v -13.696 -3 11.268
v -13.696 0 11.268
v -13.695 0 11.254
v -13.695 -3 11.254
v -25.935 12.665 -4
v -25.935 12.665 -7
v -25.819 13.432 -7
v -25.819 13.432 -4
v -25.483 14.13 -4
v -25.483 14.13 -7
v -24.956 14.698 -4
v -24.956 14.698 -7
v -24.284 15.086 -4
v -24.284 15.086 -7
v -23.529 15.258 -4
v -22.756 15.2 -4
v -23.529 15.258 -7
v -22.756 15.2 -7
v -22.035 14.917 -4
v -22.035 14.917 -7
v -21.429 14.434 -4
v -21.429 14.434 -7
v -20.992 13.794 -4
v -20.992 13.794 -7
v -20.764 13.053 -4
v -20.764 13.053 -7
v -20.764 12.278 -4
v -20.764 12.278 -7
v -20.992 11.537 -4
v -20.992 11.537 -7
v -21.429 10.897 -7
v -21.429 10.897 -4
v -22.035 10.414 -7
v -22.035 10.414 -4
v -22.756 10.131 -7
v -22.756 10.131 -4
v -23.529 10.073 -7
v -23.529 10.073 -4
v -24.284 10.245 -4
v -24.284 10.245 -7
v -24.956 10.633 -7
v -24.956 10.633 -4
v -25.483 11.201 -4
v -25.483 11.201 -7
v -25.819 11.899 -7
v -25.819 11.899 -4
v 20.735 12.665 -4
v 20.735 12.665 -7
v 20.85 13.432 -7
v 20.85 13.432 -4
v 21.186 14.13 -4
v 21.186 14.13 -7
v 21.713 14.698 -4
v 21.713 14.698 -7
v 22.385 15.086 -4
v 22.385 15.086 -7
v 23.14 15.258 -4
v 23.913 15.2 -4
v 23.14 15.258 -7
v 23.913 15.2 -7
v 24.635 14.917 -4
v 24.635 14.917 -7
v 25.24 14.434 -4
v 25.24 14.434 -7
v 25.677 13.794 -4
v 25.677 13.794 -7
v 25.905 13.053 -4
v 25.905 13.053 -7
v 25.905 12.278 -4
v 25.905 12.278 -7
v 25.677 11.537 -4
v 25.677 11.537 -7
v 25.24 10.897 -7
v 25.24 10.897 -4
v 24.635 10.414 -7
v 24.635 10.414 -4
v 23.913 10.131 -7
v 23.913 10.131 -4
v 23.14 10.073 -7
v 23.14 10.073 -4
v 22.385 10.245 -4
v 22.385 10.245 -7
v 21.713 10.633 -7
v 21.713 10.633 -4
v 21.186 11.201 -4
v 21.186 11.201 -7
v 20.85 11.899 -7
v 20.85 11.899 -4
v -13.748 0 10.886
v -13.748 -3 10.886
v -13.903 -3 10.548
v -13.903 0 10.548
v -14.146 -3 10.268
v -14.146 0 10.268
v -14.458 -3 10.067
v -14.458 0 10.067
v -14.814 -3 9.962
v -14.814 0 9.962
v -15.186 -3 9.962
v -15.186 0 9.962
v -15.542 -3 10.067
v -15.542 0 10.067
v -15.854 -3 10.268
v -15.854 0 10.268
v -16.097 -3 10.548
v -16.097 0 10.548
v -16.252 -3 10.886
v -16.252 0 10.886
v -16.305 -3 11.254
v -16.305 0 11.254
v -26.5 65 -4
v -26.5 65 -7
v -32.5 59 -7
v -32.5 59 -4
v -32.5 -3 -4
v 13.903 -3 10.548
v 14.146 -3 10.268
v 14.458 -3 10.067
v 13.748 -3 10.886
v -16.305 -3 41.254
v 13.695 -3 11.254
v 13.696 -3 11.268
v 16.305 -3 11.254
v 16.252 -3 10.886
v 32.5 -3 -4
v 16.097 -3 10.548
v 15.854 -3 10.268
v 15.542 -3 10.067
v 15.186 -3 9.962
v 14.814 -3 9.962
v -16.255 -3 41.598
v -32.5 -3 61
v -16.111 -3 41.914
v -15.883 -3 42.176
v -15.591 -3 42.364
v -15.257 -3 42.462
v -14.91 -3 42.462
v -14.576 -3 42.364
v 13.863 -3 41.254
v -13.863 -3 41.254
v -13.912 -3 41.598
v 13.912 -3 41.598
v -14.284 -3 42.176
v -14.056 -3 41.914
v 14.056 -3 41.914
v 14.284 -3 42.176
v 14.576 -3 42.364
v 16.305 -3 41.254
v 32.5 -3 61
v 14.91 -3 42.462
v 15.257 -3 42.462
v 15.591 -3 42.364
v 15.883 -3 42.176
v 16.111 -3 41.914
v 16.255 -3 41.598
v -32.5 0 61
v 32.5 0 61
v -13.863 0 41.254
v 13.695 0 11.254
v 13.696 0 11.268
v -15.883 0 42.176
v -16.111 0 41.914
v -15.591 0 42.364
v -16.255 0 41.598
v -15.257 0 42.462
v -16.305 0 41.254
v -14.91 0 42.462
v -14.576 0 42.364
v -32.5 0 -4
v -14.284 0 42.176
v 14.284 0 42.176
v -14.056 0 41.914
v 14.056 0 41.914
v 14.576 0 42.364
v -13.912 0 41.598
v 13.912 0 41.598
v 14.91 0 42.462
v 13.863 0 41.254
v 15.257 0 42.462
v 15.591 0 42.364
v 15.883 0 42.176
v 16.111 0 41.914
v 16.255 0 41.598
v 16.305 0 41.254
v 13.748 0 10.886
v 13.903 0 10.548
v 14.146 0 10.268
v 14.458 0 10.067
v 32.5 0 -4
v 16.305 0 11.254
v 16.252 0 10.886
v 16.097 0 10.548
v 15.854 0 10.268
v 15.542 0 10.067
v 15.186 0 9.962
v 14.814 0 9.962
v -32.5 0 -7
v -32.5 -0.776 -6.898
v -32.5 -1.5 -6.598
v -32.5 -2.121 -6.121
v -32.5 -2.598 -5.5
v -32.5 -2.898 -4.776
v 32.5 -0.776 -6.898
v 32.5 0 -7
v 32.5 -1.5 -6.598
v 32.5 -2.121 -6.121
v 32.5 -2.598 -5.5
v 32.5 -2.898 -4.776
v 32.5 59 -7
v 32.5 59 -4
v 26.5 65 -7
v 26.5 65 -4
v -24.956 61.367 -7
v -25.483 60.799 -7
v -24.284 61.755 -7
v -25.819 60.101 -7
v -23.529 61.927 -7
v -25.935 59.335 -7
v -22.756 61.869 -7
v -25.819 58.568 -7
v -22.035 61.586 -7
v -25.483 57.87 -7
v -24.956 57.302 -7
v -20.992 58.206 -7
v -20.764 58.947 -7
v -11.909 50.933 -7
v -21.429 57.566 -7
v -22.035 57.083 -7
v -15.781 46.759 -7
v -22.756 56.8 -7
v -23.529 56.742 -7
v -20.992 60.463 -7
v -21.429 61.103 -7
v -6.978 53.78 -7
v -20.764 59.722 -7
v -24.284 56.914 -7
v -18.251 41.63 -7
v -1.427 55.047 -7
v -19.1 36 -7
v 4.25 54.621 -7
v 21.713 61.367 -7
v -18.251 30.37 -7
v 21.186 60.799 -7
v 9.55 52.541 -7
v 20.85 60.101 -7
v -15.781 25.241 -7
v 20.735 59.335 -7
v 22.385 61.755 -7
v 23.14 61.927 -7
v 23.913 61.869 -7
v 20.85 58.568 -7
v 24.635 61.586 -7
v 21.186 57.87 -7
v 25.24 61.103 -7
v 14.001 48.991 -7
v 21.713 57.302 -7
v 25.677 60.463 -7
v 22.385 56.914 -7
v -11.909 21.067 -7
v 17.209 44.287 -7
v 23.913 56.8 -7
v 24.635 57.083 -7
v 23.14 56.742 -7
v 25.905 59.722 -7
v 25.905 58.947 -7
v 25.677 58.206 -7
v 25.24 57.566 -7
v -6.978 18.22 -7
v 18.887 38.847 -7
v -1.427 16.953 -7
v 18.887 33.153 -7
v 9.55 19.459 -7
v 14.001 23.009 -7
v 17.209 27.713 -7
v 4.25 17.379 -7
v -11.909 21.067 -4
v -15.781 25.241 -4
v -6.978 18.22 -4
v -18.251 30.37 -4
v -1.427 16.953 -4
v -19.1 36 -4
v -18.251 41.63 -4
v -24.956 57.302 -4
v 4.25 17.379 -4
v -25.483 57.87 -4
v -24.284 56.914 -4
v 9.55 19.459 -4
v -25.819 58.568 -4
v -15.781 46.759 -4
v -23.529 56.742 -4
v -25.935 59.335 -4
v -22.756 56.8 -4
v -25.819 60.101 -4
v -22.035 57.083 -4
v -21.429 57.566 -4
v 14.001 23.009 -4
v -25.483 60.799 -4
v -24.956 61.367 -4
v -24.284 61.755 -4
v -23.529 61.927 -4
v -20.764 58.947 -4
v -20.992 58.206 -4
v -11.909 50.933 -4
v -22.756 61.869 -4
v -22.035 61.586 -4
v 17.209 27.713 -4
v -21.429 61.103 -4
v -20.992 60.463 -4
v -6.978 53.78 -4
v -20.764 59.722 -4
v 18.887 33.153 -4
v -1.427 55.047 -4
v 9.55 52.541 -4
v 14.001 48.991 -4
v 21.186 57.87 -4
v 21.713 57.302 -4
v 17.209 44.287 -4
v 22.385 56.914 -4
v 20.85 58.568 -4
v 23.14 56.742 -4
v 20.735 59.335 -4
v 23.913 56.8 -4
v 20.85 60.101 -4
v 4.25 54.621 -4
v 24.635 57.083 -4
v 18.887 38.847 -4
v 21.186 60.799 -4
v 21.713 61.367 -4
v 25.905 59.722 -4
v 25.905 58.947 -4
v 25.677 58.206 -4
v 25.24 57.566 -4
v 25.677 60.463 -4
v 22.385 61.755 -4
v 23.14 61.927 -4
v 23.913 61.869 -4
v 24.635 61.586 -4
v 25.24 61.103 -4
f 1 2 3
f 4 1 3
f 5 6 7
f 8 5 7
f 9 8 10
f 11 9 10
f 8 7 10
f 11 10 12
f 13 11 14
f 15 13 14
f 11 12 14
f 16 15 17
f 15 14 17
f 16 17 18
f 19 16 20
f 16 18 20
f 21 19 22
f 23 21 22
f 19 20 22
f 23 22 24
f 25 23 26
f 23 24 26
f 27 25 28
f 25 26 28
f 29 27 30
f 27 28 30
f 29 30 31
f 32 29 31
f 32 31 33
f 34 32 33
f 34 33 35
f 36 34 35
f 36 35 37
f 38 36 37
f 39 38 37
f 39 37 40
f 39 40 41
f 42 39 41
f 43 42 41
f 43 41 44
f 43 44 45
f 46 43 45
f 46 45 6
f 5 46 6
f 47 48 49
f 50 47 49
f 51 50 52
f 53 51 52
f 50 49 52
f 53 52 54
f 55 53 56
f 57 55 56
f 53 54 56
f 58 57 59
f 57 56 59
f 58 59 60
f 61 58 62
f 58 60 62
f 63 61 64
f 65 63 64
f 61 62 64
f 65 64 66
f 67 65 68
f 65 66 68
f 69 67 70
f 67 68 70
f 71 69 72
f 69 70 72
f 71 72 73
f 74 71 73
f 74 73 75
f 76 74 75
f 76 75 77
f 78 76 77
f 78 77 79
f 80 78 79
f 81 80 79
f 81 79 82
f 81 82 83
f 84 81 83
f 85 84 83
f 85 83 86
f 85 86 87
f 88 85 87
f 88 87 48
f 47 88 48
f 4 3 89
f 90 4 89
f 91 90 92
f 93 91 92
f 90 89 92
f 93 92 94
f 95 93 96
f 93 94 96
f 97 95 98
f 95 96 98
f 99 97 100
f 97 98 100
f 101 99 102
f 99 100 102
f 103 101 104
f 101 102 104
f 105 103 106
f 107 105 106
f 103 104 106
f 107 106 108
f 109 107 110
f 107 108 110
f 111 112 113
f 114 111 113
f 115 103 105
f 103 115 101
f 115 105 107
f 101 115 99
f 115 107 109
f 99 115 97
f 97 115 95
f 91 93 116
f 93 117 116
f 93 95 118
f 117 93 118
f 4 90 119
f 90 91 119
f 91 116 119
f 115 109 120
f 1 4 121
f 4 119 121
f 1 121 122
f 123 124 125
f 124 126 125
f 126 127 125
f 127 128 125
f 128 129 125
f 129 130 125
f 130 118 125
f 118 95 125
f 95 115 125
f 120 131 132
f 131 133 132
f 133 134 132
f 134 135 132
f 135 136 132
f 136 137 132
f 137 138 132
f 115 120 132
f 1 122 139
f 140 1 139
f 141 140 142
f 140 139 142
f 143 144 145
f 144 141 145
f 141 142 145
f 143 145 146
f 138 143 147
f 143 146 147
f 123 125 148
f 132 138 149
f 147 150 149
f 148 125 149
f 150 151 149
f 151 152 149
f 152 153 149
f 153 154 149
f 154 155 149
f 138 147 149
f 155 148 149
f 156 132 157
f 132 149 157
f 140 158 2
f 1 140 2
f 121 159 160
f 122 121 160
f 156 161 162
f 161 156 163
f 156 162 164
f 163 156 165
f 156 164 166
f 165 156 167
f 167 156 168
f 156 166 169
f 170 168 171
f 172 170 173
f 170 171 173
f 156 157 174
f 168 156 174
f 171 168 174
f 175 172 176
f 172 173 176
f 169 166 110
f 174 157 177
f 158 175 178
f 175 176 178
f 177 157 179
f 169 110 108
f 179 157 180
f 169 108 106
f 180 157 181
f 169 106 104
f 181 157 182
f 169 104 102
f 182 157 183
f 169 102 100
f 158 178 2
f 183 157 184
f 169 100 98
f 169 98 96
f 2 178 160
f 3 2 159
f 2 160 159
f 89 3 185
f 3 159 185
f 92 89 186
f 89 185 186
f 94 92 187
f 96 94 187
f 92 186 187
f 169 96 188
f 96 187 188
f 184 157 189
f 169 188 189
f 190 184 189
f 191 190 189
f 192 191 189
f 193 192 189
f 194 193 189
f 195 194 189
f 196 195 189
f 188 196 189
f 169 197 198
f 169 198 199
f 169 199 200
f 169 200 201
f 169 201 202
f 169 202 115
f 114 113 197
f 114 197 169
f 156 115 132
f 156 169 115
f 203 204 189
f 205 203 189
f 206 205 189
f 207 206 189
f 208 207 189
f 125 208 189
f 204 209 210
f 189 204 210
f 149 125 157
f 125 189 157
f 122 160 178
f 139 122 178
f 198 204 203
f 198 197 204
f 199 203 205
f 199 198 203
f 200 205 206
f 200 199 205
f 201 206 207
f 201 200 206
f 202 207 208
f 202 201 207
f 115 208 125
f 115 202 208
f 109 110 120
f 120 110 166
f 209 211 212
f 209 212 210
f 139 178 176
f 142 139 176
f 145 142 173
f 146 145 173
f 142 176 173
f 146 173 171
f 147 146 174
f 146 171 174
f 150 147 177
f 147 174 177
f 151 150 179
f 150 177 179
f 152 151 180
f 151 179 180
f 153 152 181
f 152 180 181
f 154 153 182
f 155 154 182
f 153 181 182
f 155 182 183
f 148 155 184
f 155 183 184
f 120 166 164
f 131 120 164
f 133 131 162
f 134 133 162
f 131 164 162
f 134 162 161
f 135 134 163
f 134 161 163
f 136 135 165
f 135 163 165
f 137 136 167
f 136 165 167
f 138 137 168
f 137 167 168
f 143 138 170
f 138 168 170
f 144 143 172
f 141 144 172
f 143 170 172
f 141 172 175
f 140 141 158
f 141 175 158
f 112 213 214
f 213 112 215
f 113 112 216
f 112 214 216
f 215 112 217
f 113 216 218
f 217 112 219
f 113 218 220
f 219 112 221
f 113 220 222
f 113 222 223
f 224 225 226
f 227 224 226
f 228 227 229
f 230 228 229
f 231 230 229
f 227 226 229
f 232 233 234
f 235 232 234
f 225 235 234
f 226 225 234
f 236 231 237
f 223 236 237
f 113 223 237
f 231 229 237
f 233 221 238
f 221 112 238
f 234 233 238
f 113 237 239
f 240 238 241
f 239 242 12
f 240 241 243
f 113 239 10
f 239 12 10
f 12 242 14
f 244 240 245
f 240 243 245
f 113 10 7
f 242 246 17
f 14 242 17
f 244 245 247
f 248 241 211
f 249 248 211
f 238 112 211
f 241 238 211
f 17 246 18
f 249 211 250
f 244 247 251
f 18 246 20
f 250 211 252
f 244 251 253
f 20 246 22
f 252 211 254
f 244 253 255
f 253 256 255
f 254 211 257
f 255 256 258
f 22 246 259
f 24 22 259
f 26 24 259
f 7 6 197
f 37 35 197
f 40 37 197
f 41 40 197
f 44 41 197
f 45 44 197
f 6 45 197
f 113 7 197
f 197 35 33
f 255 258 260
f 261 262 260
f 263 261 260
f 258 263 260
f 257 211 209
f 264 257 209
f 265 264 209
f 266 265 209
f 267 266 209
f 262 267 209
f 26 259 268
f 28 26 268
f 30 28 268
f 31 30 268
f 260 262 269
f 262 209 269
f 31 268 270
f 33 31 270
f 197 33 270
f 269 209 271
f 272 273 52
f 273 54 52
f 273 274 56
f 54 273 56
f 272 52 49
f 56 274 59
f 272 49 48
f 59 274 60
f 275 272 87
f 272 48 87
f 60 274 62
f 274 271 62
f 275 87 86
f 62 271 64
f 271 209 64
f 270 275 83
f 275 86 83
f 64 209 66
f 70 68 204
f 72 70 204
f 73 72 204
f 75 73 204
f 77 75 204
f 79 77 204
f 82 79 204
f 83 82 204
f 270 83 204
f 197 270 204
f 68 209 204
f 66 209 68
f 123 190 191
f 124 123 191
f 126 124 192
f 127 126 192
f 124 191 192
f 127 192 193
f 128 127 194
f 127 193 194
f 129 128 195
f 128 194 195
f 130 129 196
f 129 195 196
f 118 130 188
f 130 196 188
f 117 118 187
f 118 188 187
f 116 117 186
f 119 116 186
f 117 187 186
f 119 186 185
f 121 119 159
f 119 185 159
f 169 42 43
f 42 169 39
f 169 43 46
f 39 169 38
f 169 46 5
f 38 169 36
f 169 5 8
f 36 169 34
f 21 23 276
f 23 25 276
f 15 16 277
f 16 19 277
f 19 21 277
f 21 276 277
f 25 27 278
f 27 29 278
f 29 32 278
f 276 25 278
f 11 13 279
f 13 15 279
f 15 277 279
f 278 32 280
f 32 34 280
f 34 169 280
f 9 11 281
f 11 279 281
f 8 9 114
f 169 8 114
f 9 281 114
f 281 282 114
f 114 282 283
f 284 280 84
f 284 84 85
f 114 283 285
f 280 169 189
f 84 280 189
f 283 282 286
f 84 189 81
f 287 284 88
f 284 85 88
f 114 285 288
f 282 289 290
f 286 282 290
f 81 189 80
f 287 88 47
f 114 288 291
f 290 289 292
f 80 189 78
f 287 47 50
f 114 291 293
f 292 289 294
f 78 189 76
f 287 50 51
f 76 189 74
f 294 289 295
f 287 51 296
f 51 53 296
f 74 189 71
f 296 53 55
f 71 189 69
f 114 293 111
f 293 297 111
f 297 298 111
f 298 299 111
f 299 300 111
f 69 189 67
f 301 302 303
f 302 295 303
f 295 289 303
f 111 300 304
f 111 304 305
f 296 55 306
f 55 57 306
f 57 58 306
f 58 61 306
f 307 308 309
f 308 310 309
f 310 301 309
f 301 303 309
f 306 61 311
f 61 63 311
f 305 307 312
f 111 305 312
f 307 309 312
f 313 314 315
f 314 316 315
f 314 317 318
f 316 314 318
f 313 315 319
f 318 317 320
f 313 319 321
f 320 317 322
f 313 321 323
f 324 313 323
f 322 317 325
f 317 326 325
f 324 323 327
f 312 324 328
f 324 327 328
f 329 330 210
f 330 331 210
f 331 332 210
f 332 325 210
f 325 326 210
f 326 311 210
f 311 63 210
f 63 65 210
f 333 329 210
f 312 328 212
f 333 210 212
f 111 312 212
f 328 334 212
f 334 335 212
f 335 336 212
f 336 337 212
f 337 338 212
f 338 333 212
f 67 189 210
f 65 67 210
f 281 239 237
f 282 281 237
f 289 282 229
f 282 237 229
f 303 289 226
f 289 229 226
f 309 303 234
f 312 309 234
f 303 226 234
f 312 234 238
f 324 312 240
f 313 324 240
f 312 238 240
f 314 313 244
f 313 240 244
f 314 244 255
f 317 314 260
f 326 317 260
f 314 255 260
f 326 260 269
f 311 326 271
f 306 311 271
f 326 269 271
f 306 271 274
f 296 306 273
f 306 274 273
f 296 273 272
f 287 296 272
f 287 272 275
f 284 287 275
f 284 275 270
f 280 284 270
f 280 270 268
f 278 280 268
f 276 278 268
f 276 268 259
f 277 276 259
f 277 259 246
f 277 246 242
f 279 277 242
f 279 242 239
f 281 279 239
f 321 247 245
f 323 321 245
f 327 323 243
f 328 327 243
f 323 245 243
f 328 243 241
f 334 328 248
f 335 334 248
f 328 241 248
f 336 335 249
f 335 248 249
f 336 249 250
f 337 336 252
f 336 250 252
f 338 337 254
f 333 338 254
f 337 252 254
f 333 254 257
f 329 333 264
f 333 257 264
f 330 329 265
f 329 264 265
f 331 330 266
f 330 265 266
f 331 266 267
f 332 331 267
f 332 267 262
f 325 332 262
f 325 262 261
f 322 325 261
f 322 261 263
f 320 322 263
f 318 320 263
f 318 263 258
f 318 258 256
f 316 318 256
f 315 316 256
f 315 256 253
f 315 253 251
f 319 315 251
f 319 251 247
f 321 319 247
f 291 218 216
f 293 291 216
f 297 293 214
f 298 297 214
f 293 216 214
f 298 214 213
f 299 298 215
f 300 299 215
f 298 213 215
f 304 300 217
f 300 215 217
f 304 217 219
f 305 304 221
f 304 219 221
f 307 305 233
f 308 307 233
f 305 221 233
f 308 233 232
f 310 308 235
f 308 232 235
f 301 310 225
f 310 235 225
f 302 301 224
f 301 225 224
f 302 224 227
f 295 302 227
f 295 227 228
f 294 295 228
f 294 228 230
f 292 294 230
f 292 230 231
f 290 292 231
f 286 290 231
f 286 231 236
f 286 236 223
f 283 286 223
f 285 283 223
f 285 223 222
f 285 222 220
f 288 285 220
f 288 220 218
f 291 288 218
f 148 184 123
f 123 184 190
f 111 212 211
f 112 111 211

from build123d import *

# Parameters (mm, degrees)
EXTRUDE_1_DEPTH      = 32.5
EXTRUDE_1_DEPTH_BACK = 32.5
FILLET_2_R           = 3
SKETCH_2_R           = 19.1
SKETCH_2_R_2         = 2.6
CUT_EXTRUDE_1_DEPTH  = 13.125
CUT_EXTRUDE_2_DEPTH  = 10


with BuildPart() as part:
    # Эскиз1 → Бобышка-Вытянуть1 (new, two sides: drawn at the far end of the back side and taken through both)
    with BuildSketch(Plane(origin=(0, 0, 0), x_dir=(0, 0, -1), z_dir=(1, 0, 0)).offset(-EXTRUDE_1_DEPTH_BACK)):
        Polygon((7, 65), (7, -3), (-61, -3), (-61, 0), (4, 0), (4, 65), align=None)
    extrude(amount=EXTRUDE_1_DEPTH + EXTRUDE_1_DEPTH_BACK)

    # Скругление2
    fillet_2_edges = [part.edges().sort_by_distance(p)[0] for p in [
        (0, -3, -7),
    ]]
    fillet(fillet_2_edges, radius=FILLET_2_R)

    # Эскиз2 → Вырез-Вытянуть1 (cut)
    with BuildSketch(Plane(origin=(0, 0, -7), x_dir=(-1, 0, 0), z_dir=(0, 0, -1))):
        with Locations((0, 36)):
            Circle(SKETCH_2_R)
        with Locations((-23.334523779, 59.334523779)):
            Circle(SKETCH_2_R_2)
        with Locations((23.334523779, 59.334523779)):
            Circle(SKETCH_2_R_2)
        with Locations((23.334523779, 12.665476221)):
            Circle(SKETCH_2_R_2)
        with Locations((-23.334523779, 12.665476221)):
            Circle(SKETCH_2_R_2)
        Polygon((-26.5, 65), (-32.5, 59), (-32.5, 65), align=None)
        Polygon((32.5, 59), (32.5, 65), (26.5, 65), align=None)
    extrude(amount=-CUT_EXTRUDE_1_DEPTH, mode=Mode.SUBTRACT)

    # Эскиз3 → Вырез-Вытянуть2 (cut)
    with BuildSketch(Plane(origin=(0, 0, 0), x_dir=(1, 0, 0), z_dir=(0, 1, 0))):
        with BuildLine():
            ThreePointArc((-13.695464845, -11.253573908), (-15, -9.949038753), (-16.304535155, -11.253573908))
            Line((-16.304535155, -11.253573908), (-16.304535155, -41.253573908))
            ThreePointArc((-16.304535155, -41.253573908), (-15.08357618, -42.474532883), (-13.862617205, -41.253573908))
            Line((-13.862617205, -41.253573908), (-13.695464845, -11.253573908))
        make_face()
        with BuildLine():
            Line((16.304535155, -41.253573908), (16.304535155, -11.253573908))
            ThreePointArc((16.304535155, -11.253573908), (15, -9.949038753), (13.695464845, -11.253573908))
            Line((13.695464845, -11.253573908), (13.862617205, -41.253573908))
            ThreePointArc((13.862617205, -41.253573908), (15.08357618, -42.474532883), (16.304535155, -41.253573908))
        make_face()
    extrude(amount=-CUT_EXTRUDE_2_DEPTH, mode=Mode.SUBTRACT)


solid = part.part
